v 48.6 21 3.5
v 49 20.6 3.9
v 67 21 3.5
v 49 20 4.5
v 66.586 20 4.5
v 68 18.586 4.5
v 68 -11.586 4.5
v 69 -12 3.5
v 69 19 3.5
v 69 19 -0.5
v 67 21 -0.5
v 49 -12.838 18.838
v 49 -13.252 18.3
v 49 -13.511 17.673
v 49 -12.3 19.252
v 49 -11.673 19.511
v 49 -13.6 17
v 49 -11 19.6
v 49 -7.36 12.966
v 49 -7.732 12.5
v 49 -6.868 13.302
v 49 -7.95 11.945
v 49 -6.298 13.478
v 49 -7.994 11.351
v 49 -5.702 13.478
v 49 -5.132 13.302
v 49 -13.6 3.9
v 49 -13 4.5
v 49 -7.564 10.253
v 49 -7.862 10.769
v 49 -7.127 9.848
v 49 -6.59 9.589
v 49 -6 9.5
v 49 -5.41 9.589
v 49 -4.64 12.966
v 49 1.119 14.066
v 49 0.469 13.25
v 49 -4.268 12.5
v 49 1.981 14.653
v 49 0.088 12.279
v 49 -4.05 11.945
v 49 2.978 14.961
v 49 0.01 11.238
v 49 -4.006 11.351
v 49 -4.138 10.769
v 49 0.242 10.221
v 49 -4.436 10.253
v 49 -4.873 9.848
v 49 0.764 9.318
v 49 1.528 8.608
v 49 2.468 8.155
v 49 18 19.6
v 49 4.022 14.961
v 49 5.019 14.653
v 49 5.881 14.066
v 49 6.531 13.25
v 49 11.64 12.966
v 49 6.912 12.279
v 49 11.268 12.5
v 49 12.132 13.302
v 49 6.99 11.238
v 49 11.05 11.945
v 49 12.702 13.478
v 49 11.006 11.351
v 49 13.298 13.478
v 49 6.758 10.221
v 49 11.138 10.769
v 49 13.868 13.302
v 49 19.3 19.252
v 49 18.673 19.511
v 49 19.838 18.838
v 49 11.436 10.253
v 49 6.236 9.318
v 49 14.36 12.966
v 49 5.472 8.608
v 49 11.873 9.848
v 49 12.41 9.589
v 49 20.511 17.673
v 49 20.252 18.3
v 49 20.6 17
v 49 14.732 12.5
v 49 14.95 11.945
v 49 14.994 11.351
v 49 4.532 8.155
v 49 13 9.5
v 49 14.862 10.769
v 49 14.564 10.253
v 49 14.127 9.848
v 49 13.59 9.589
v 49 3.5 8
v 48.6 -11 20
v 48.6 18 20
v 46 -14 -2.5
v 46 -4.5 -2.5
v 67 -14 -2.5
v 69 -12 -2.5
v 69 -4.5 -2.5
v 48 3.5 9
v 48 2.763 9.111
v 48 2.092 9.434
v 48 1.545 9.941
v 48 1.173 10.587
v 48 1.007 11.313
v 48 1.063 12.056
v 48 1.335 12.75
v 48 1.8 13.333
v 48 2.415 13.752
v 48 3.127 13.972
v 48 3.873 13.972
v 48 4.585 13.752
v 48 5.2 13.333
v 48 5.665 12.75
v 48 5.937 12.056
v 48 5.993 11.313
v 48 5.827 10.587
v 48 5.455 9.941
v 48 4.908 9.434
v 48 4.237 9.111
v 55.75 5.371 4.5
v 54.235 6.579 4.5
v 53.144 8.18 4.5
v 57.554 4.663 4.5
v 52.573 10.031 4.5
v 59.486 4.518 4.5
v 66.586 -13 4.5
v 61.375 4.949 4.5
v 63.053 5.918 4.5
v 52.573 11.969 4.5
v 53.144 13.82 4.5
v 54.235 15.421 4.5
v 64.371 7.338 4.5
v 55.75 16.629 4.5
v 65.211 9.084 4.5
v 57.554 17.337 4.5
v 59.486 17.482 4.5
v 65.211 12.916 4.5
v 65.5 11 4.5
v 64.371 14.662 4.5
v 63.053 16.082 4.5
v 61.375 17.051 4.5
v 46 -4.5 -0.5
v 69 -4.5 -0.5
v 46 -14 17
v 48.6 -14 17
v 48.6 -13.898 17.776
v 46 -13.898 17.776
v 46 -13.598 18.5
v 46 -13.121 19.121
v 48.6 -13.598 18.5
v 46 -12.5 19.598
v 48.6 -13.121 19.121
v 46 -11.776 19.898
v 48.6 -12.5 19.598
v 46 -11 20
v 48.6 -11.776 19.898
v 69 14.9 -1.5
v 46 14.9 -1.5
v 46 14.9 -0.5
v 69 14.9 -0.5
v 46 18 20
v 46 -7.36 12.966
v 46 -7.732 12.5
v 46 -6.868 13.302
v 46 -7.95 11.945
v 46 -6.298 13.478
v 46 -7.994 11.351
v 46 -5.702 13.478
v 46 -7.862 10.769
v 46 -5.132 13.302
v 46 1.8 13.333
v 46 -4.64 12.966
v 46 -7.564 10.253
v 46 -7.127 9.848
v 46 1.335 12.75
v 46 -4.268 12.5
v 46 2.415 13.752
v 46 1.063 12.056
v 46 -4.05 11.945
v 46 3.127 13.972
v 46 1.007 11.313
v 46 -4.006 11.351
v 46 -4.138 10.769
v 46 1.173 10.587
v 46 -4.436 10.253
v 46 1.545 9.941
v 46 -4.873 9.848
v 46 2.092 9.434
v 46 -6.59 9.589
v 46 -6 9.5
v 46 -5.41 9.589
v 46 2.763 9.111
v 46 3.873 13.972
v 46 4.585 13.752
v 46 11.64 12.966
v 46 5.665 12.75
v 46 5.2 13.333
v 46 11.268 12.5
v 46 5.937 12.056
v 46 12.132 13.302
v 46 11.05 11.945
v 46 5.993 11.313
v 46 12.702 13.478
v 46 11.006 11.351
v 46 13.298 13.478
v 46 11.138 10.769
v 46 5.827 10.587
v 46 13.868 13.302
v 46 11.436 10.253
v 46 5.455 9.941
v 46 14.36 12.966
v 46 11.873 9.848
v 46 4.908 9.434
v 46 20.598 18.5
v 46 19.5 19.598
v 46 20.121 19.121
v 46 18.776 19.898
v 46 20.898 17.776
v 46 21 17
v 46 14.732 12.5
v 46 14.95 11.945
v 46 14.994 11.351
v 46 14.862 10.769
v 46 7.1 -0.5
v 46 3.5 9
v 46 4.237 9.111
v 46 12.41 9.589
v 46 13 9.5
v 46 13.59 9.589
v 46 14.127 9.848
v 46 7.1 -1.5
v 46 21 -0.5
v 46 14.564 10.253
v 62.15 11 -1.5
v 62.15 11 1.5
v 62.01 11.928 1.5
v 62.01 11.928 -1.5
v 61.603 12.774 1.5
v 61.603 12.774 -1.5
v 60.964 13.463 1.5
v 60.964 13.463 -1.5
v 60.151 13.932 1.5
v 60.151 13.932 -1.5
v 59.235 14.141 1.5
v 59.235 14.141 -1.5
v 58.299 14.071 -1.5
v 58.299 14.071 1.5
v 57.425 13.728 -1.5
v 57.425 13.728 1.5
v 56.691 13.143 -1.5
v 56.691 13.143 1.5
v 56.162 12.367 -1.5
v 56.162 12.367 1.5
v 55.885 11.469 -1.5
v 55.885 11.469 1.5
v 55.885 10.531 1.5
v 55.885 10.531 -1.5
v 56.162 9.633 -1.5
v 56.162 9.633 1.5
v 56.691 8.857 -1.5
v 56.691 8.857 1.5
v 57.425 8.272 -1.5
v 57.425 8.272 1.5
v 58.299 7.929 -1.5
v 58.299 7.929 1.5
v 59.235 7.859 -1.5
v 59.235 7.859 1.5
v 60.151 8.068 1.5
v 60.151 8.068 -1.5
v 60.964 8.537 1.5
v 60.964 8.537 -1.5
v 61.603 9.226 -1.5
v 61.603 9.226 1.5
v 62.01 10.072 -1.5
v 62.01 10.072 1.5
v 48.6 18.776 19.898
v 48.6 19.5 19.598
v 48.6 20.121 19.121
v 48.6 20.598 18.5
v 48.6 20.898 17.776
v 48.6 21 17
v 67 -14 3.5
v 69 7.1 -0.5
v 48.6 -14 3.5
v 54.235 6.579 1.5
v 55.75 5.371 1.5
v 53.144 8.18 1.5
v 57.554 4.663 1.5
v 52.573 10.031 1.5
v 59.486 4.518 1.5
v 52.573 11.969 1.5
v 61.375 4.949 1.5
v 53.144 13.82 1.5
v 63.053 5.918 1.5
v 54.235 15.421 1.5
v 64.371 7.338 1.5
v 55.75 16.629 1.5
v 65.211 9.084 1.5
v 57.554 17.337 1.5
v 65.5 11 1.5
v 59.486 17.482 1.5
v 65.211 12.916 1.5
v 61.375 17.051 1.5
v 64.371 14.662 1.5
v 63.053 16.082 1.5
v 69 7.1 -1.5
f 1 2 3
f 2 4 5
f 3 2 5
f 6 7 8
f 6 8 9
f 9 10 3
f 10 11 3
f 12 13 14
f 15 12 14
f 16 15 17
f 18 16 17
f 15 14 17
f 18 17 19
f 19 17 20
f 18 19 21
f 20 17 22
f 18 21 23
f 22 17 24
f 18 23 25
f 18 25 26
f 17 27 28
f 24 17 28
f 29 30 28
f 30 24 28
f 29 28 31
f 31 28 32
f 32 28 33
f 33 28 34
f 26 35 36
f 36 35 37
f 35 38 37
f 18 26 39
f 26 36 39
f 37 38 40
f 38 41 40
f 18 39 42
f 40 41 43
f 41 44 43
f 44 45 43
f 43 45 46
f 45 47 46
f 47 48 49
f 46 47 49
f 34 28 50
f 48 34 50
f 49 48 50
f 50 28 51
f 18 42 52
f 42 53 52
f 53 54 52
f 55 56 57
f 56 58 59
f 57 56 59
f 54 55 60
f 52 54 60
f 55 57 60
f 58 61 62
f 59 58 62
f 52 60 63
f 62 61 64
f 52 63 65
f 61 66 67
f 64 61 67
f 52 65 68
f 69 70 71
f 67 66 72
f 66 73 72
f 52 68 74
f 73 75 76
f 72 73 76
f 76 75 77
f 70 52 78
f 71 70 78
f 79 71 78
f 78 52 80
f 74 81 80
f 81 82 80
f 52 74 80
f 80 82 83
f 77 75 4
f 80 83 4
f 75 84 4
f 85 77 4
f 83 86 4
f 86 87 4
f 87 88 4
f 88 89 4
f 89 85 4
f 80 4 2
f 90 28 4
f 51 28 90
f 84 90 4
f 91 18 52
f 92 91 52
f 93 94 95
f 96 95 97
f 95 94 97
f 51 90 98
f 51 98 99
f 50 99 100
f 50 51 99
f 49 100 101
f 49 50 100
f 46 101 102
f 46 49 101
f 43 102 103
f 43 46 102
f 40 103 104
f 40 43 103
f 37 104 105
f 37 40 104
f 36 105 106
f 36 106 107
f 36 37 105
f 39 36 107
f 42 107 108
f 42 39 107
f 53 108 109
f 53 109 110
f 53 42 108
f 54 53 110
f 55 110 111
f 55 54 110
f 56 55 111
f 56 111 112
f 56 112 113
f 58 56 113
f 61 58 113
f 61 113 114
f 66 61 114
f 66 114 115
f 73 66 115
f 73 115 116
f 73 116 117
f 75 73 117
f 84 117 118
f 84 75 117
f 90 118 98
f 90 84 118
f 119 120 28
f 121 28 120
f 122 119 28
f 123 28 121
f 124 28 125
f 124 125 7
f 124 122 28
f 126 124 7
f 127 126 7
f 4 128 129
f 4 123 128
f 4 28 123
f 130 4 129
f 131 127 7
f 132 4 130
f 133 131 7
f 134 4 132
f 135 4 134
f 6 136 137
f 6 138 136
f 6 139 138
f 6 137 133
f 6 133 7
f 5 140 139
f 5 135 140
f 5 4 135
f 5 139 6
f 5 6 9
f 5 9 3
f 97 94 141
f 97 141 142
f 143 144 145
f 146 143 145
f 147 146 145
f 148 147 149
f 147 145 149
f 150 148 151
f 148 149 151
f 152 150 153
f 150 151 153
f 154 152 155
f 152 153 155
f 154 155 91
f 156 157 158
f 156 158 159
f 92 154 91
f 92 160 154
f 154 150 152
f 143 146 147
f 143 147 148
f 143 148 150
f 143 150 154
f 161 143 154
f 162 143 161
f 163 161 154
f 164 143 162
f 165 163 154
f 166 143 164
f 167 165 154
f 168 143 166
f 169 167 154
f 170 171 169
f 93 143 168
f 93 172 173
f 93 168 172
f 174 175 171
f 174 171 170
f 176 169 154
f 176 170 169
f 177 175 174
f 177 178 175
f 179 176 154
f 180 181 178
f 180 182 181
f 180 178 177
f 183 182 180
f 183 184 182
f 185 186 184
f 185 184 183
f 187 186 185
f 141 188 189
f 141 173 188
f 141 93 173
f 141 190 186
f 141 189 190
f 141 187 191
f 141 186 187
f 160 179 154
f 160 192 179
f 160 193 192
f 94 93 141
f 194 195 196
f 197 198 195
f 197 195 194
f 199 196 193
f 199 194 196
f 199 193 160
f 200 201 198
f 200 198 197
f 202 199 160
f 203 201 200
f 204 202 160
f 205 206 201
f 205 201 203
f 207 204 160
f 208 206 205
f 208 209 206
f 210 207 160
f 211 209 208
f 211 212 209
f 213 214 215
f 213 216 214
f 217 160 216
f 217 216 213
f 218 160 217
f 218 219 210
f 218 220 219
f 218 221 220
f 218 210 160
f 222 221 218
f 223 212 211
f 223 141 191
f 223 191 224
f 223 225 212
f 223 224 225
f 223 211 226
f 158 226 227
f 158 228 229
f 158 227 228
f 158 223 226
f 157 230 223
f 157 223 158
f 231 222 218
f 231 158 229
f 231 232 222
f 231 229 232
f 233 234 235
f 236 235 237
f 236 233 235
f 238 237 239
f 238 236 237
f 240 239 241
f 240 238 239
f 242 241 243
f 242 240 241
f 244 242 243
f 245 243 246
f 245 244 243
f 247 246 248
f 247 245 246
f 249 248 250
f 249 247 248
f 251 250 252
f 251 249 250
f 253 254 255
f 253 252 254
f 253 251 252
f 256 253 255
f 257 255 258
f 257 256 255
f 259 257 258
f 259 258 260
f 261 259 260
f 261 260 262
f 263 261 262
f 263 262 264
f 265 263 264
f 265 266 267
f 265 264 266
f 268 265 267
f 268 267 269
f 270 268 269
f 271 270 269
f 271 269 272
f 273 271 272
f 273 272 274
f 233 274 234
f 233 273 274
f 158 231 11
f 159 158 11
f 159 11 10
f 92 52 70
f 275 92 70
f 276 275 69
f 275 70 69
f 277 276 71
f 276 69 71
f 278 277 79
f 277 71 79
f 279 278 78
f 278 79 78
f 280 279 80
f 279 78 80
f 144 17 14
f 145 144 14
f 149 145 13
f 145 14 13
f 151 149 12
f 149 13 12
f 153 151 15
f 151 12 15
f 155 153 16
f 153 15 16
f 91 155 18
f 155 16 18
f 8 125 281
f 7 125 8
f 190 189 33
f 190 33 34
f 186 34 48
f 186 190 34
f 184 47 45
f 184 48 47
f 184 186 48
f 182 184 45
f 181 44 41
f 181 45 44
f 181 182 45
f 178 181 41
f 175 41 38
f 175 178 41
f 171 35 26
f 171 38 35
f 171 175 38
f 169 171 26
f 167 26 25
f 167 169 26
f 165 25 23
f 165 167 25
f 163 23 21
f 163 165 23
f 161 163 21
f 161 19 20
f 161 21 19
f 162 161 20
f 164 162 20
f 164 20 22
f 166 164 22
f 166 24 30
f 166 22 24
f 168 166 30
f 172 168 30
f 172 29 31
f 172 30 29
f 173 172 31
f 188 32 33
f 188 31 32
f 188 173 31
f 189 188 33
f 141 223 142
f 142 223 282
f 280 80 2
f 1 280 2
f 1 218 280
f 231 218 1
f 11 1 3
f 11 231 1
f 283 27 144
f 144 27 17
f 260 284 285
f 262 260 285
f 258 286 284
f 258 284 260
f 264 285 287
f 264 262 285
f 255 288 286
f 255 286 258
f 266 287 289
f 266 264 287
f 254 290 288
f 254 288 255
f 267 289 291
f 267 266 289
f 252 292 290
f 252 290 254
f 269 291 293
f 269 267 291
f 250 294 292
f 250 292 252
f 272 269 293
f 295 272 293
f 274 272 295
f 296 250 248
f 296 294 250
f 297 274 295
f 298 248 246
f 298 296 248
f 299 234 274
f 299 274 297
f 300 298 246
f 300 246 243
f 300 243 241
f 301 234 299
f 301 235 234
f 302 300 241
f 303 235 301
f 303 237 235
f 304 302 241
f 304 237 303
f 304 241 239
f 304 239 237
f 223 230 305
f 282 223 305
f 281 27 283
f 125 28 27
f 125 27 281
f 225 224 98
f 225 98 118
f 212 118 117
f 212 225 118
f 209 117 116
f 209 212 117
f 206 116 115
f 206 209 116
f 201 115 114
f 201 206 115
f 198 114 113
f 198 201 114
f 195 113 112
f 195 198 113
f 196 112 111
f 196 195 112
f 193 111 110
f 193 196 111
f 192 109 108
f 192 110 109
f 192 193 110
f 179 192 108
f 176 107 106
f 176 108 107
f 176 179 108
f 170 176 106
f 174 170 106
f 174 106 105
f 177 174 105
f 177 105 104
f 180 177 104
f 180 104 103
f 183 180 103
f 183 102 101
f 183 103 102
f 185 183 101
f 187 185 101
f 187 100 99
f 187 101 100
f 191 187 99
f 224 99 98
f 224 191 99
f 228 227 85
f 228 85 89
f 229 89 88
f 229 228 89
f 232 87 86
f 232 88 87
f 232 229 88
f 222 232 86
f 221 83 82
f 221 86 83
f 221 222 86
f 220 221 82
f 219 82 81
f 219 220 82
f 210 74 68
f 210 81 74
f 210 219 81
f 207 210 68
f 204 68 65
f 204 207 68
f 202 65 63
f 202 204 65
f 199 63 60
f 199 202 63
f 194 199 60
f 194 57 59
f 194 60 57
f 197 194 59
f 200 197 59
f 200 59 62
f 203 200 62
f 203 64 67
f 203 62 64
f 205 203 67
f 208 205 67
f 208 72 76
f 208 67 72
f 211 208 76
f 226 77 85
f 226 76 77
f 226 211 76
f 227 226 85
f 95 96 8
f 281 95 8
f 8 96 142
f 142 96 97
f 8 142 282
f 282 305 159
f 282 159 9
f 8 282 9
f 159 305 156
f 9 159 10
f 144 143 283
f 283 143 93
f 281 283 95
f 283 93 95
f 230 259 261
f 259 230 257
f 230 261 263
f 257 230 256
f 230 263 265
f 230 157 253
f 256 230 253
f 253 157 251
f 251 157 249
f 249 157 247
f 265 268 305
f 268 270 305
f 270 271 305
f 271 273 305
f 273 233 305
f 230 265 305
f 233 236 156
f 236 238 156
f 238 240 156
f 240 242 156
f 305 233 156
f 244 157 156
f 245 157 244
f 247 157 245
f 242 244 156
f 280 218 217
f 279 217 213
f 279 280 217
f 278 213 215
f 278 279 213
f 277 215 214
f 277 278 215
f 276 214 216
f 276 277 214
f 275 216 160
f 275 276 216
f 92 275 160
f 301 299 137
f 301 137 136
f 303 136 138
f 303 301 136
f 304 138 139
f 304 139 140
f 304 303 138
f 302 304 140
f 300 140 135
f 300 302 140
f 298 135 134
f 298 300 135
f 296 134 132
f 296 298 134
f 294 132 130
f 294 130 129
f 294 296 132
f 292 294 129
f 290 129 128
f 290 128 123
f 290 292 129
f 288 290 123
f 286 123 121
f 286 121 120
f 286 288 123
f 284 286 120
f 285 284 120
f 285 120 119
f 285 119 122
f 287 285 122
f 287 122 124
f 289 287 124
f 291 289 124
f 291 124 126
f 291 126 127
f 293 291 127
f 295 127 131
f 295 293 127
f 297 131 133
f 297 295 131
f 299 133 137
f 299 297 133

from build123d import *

# Parameters (mm, degrees)
CYLINDER032_R         = 3.15
CYLINDER032_DEPTH     = 10
CYLINDER033_R         = 6.5
CYLINDER033_DEPTH     = 3
CYLINDER034_R         = 2.5
CYLINDER034_DEPTH     = 10
CYLINDER036_R         = 2
CYLINDER036_DEPTH     = 14
CYLINDER037_R         = 2
CYLINDER037_DEPTH     = 14
BOX059_W              = 3
BOX059_H              = 35
BOX059_DEPTH          = 20.5
FILLET005015029_R     = 3
CHAMFER010015007_SIZE = 0.4
BOX061_W              = 23
BOX061_H              = 9.5
BOX061_DEPTH          = 2
CHAMFER010015004_SIZE = 2
BOX062_W              = 23
BOX062_H              = 7.8
BOX062_DEPTH          = 1
BOX060_W              = 23
BOX060_H              = 35
BOX060_DEPTH          = 5
CHAMFER010015003_SIZE = 2
CHAMFER010015005_SIZE = 2
CHAMFER010015006_SIZE = 1
CHAMFER010015008_SIZE = 1


with BuildPart() as cylinder032:
    # Cylinder032 → Cylinder032 (new body)
    with BuildSketch(Plane(origin=(59, 11, -1.5), x_dir=(1, 0, 0), z_dir=(0, 0, 1))):
        Circle(CYLINDER032_R)
    extrude(amount=CYLINDER032_DEPTH)


with BuildPart() as fusion001021004009015013002:
    # Cylinder033 → Cylinder033 (new body)
    with BuildSketch(Plane(origin=(59, 11, 1.5), x_dir=(1, 0, 0), z_dir=(0, 0, 1))):
        Circle(CYLINDER033_R)
    extrude(amount=CYLINDER033_DEPTH)

    # Fusion001021004009015013002: union Cylinder032
    add(cylinder032.part)


with BuildPart() as cylinder034:
    # Cylinder034 → Cylinder034 (new body)
    with BuildSketch(Plane(origin=(42.5, 3.5, 11.5), x_dir=(0, 0, -1), z_dir=(1, 0, 0))):
        Circle(CYLINDER034_R)
    extrude(amount=CYLINDER034_DEPTH)


with BuildPart() as cylinder036:
    # Cylinder036 → Cylinder036 (new body)
    with BuildSketch(Plane(origin=(37, 13, 11.5), x_dir=(0, 0, -1), z_dir=(1, 0, 0))):
        Circle(CYLINDER036_R)
    extrude(amount=CYLINDER036_DEPTH)


with BuildPart() as fusion001021004009015013004:
    # Cylinder037 → Cylinder037 (new body)
    with BuildSketch(Plane(origin=(37, -6, 11.5), x_dir=(0, 0, -1), z_dir=(1, 0, 0))):
        Circle(CYLINDER037_R)
    extrude(amount=CYLINDER037_DEPTH)

    # Fusion001021004009015013004: union Cylinder034, Cylinder036
    add(cylinder034.part)
    add(cylinder036.part)


with BuildPart() as chamfer010015007:
    # Box059 → Box059 (new body)
    with BuildSketch(Plane(origin=(46, -14, -0.5), x_dir=(1, 0, 0), z_dir=(0, 0, 1))):
        with Locations((1.5, 17.5)):
            Rectangle(BOX059_W, BOX059_H)
    extrude(amount=BOX059_DEPTH)

    # Fillet005015029
    fillet005015029_edges = [chamfer010015007.edges().sort_by_distance(p)[0] for p in [
        (47.5, -14, 20),
        (47.5, 21, 20),
    ]]
    fillet(fillet005015029_edges, radius=FILLET005015029_R)

    # Chamfer010015007
    chamfer010015007_edges = [chamfer010015007.edges().sort_by_distance(p)[0] for p in [
        (49, -14, 8.25),
        (49, -13.12132, 19.12132),
        (49, 3.5, 20),
        (49, 21, 8.25),
        (49, 20.12132, 19.12132),
    ]]
    chamfer(chamfer010015007_edges, length=CHAMFER010015007_SIZE)


with BuildPart() as chamfer010015004:
    # Box061 → Box061 (new body)
    with BuildSketch(Plane(origin=(46, -14, -2.5), x_dir=(1, 0, 0), z_dir=(0, 0, 1))):
        with Locations((11.5, 4.75)):
            Rectangle(BOX061_W, BOX061_H)
    extrude(amount=BOX061_DEPTH)

    # Chamfer010015004
    chamfer010015004_edges = [chamfer010015004.edges().sort_by_distance(p)[0] for p in [
        (69, -14, -1.5),
    ]]
    chamfer(chamfer010015004_edges, length=CHAMFER010015004_SIZE)


with BuildPart() as cube060:
    # Box062 → Box062 (new body)
    with BuildSketch(Plane(origin=(46, 7.1, -1.5), x_dir=(1, 0, 0), z_dir=(0, 0, 1))):
        with Locations((11.5, 3.9)):
            Rectangle(BOX062_W, BOX062_H)
    extrude(amount=BOX062_DEPTH)


with BuildPart() as side_mount:
    # Box060 → Box060 (new body)
    with BuildSketch(Plane(origin=(46, -14, -0.5), x_dir=(1, 0, 0), z_dir=(0, 0, 1))):
        with Locations((11.5, 17.5)):
            Rectangle(BOX060_W, BOX060_H)
    extrude(amount=BOX060_DEPTH)

    # Chamfer010015003
    chamfer010015003_edges = [side_mount.edges().sort_by_distance(p)[0] for p in [
        (69, -14, 2),
    ]]
    chamfer(chamfer010015003_edges, length=CHAMFER010015003_SIZE)

    # Chamfer010015005
    chamfer010015005_edges = [side_mount.edges().sort_by_distance(p)[0] for p in [
        (69, 21, 2),
    ]]
    chamfer(chamfer010015005_edges, length=CHAMFER010015005_SIZE)

    # Chamfer010015006
    chamfer010015006_edges = [side_mount.edges().sort_by_distance(p)[0] for p in [
        (69, 3.5, 4.5),
        (68, 20, 4.5),
        (56.5, 21, 4.5),
        (56.5, -14, 4.5),
        (68, -13, 4.5),
    ]]
    chamfer(chamfer010015006_edges, length=CHAMFER010015006_SIZE)

    # Fusion001021004009015013005: union Chamfer010015007, Chamfer010015004, Cube060
    add(chamfer010015007.part)
    add(chamfer010015004.part)
    add(cube060.part)

    # Cut019003009: cut Fusion001021004009015013004
    add(fusion001021004009015013004.part, mode=Mode.SUBTRACT)

    # Chamfer010015008
    chamfer010015008_edges = [side_mount.edges().sort_by_distance(p)[0] for p in [
        (49, 3.5, 14),
    ]]
    chamfer(chamfer010015008_edges, length=CHAMFER010015008_SIZE)

    # Cut019003010: cut Fusion001021004009015013002
    add(fusion001021004009015013002.part, mode=Mode.SUBTRACT)


solid = side_mount.part
